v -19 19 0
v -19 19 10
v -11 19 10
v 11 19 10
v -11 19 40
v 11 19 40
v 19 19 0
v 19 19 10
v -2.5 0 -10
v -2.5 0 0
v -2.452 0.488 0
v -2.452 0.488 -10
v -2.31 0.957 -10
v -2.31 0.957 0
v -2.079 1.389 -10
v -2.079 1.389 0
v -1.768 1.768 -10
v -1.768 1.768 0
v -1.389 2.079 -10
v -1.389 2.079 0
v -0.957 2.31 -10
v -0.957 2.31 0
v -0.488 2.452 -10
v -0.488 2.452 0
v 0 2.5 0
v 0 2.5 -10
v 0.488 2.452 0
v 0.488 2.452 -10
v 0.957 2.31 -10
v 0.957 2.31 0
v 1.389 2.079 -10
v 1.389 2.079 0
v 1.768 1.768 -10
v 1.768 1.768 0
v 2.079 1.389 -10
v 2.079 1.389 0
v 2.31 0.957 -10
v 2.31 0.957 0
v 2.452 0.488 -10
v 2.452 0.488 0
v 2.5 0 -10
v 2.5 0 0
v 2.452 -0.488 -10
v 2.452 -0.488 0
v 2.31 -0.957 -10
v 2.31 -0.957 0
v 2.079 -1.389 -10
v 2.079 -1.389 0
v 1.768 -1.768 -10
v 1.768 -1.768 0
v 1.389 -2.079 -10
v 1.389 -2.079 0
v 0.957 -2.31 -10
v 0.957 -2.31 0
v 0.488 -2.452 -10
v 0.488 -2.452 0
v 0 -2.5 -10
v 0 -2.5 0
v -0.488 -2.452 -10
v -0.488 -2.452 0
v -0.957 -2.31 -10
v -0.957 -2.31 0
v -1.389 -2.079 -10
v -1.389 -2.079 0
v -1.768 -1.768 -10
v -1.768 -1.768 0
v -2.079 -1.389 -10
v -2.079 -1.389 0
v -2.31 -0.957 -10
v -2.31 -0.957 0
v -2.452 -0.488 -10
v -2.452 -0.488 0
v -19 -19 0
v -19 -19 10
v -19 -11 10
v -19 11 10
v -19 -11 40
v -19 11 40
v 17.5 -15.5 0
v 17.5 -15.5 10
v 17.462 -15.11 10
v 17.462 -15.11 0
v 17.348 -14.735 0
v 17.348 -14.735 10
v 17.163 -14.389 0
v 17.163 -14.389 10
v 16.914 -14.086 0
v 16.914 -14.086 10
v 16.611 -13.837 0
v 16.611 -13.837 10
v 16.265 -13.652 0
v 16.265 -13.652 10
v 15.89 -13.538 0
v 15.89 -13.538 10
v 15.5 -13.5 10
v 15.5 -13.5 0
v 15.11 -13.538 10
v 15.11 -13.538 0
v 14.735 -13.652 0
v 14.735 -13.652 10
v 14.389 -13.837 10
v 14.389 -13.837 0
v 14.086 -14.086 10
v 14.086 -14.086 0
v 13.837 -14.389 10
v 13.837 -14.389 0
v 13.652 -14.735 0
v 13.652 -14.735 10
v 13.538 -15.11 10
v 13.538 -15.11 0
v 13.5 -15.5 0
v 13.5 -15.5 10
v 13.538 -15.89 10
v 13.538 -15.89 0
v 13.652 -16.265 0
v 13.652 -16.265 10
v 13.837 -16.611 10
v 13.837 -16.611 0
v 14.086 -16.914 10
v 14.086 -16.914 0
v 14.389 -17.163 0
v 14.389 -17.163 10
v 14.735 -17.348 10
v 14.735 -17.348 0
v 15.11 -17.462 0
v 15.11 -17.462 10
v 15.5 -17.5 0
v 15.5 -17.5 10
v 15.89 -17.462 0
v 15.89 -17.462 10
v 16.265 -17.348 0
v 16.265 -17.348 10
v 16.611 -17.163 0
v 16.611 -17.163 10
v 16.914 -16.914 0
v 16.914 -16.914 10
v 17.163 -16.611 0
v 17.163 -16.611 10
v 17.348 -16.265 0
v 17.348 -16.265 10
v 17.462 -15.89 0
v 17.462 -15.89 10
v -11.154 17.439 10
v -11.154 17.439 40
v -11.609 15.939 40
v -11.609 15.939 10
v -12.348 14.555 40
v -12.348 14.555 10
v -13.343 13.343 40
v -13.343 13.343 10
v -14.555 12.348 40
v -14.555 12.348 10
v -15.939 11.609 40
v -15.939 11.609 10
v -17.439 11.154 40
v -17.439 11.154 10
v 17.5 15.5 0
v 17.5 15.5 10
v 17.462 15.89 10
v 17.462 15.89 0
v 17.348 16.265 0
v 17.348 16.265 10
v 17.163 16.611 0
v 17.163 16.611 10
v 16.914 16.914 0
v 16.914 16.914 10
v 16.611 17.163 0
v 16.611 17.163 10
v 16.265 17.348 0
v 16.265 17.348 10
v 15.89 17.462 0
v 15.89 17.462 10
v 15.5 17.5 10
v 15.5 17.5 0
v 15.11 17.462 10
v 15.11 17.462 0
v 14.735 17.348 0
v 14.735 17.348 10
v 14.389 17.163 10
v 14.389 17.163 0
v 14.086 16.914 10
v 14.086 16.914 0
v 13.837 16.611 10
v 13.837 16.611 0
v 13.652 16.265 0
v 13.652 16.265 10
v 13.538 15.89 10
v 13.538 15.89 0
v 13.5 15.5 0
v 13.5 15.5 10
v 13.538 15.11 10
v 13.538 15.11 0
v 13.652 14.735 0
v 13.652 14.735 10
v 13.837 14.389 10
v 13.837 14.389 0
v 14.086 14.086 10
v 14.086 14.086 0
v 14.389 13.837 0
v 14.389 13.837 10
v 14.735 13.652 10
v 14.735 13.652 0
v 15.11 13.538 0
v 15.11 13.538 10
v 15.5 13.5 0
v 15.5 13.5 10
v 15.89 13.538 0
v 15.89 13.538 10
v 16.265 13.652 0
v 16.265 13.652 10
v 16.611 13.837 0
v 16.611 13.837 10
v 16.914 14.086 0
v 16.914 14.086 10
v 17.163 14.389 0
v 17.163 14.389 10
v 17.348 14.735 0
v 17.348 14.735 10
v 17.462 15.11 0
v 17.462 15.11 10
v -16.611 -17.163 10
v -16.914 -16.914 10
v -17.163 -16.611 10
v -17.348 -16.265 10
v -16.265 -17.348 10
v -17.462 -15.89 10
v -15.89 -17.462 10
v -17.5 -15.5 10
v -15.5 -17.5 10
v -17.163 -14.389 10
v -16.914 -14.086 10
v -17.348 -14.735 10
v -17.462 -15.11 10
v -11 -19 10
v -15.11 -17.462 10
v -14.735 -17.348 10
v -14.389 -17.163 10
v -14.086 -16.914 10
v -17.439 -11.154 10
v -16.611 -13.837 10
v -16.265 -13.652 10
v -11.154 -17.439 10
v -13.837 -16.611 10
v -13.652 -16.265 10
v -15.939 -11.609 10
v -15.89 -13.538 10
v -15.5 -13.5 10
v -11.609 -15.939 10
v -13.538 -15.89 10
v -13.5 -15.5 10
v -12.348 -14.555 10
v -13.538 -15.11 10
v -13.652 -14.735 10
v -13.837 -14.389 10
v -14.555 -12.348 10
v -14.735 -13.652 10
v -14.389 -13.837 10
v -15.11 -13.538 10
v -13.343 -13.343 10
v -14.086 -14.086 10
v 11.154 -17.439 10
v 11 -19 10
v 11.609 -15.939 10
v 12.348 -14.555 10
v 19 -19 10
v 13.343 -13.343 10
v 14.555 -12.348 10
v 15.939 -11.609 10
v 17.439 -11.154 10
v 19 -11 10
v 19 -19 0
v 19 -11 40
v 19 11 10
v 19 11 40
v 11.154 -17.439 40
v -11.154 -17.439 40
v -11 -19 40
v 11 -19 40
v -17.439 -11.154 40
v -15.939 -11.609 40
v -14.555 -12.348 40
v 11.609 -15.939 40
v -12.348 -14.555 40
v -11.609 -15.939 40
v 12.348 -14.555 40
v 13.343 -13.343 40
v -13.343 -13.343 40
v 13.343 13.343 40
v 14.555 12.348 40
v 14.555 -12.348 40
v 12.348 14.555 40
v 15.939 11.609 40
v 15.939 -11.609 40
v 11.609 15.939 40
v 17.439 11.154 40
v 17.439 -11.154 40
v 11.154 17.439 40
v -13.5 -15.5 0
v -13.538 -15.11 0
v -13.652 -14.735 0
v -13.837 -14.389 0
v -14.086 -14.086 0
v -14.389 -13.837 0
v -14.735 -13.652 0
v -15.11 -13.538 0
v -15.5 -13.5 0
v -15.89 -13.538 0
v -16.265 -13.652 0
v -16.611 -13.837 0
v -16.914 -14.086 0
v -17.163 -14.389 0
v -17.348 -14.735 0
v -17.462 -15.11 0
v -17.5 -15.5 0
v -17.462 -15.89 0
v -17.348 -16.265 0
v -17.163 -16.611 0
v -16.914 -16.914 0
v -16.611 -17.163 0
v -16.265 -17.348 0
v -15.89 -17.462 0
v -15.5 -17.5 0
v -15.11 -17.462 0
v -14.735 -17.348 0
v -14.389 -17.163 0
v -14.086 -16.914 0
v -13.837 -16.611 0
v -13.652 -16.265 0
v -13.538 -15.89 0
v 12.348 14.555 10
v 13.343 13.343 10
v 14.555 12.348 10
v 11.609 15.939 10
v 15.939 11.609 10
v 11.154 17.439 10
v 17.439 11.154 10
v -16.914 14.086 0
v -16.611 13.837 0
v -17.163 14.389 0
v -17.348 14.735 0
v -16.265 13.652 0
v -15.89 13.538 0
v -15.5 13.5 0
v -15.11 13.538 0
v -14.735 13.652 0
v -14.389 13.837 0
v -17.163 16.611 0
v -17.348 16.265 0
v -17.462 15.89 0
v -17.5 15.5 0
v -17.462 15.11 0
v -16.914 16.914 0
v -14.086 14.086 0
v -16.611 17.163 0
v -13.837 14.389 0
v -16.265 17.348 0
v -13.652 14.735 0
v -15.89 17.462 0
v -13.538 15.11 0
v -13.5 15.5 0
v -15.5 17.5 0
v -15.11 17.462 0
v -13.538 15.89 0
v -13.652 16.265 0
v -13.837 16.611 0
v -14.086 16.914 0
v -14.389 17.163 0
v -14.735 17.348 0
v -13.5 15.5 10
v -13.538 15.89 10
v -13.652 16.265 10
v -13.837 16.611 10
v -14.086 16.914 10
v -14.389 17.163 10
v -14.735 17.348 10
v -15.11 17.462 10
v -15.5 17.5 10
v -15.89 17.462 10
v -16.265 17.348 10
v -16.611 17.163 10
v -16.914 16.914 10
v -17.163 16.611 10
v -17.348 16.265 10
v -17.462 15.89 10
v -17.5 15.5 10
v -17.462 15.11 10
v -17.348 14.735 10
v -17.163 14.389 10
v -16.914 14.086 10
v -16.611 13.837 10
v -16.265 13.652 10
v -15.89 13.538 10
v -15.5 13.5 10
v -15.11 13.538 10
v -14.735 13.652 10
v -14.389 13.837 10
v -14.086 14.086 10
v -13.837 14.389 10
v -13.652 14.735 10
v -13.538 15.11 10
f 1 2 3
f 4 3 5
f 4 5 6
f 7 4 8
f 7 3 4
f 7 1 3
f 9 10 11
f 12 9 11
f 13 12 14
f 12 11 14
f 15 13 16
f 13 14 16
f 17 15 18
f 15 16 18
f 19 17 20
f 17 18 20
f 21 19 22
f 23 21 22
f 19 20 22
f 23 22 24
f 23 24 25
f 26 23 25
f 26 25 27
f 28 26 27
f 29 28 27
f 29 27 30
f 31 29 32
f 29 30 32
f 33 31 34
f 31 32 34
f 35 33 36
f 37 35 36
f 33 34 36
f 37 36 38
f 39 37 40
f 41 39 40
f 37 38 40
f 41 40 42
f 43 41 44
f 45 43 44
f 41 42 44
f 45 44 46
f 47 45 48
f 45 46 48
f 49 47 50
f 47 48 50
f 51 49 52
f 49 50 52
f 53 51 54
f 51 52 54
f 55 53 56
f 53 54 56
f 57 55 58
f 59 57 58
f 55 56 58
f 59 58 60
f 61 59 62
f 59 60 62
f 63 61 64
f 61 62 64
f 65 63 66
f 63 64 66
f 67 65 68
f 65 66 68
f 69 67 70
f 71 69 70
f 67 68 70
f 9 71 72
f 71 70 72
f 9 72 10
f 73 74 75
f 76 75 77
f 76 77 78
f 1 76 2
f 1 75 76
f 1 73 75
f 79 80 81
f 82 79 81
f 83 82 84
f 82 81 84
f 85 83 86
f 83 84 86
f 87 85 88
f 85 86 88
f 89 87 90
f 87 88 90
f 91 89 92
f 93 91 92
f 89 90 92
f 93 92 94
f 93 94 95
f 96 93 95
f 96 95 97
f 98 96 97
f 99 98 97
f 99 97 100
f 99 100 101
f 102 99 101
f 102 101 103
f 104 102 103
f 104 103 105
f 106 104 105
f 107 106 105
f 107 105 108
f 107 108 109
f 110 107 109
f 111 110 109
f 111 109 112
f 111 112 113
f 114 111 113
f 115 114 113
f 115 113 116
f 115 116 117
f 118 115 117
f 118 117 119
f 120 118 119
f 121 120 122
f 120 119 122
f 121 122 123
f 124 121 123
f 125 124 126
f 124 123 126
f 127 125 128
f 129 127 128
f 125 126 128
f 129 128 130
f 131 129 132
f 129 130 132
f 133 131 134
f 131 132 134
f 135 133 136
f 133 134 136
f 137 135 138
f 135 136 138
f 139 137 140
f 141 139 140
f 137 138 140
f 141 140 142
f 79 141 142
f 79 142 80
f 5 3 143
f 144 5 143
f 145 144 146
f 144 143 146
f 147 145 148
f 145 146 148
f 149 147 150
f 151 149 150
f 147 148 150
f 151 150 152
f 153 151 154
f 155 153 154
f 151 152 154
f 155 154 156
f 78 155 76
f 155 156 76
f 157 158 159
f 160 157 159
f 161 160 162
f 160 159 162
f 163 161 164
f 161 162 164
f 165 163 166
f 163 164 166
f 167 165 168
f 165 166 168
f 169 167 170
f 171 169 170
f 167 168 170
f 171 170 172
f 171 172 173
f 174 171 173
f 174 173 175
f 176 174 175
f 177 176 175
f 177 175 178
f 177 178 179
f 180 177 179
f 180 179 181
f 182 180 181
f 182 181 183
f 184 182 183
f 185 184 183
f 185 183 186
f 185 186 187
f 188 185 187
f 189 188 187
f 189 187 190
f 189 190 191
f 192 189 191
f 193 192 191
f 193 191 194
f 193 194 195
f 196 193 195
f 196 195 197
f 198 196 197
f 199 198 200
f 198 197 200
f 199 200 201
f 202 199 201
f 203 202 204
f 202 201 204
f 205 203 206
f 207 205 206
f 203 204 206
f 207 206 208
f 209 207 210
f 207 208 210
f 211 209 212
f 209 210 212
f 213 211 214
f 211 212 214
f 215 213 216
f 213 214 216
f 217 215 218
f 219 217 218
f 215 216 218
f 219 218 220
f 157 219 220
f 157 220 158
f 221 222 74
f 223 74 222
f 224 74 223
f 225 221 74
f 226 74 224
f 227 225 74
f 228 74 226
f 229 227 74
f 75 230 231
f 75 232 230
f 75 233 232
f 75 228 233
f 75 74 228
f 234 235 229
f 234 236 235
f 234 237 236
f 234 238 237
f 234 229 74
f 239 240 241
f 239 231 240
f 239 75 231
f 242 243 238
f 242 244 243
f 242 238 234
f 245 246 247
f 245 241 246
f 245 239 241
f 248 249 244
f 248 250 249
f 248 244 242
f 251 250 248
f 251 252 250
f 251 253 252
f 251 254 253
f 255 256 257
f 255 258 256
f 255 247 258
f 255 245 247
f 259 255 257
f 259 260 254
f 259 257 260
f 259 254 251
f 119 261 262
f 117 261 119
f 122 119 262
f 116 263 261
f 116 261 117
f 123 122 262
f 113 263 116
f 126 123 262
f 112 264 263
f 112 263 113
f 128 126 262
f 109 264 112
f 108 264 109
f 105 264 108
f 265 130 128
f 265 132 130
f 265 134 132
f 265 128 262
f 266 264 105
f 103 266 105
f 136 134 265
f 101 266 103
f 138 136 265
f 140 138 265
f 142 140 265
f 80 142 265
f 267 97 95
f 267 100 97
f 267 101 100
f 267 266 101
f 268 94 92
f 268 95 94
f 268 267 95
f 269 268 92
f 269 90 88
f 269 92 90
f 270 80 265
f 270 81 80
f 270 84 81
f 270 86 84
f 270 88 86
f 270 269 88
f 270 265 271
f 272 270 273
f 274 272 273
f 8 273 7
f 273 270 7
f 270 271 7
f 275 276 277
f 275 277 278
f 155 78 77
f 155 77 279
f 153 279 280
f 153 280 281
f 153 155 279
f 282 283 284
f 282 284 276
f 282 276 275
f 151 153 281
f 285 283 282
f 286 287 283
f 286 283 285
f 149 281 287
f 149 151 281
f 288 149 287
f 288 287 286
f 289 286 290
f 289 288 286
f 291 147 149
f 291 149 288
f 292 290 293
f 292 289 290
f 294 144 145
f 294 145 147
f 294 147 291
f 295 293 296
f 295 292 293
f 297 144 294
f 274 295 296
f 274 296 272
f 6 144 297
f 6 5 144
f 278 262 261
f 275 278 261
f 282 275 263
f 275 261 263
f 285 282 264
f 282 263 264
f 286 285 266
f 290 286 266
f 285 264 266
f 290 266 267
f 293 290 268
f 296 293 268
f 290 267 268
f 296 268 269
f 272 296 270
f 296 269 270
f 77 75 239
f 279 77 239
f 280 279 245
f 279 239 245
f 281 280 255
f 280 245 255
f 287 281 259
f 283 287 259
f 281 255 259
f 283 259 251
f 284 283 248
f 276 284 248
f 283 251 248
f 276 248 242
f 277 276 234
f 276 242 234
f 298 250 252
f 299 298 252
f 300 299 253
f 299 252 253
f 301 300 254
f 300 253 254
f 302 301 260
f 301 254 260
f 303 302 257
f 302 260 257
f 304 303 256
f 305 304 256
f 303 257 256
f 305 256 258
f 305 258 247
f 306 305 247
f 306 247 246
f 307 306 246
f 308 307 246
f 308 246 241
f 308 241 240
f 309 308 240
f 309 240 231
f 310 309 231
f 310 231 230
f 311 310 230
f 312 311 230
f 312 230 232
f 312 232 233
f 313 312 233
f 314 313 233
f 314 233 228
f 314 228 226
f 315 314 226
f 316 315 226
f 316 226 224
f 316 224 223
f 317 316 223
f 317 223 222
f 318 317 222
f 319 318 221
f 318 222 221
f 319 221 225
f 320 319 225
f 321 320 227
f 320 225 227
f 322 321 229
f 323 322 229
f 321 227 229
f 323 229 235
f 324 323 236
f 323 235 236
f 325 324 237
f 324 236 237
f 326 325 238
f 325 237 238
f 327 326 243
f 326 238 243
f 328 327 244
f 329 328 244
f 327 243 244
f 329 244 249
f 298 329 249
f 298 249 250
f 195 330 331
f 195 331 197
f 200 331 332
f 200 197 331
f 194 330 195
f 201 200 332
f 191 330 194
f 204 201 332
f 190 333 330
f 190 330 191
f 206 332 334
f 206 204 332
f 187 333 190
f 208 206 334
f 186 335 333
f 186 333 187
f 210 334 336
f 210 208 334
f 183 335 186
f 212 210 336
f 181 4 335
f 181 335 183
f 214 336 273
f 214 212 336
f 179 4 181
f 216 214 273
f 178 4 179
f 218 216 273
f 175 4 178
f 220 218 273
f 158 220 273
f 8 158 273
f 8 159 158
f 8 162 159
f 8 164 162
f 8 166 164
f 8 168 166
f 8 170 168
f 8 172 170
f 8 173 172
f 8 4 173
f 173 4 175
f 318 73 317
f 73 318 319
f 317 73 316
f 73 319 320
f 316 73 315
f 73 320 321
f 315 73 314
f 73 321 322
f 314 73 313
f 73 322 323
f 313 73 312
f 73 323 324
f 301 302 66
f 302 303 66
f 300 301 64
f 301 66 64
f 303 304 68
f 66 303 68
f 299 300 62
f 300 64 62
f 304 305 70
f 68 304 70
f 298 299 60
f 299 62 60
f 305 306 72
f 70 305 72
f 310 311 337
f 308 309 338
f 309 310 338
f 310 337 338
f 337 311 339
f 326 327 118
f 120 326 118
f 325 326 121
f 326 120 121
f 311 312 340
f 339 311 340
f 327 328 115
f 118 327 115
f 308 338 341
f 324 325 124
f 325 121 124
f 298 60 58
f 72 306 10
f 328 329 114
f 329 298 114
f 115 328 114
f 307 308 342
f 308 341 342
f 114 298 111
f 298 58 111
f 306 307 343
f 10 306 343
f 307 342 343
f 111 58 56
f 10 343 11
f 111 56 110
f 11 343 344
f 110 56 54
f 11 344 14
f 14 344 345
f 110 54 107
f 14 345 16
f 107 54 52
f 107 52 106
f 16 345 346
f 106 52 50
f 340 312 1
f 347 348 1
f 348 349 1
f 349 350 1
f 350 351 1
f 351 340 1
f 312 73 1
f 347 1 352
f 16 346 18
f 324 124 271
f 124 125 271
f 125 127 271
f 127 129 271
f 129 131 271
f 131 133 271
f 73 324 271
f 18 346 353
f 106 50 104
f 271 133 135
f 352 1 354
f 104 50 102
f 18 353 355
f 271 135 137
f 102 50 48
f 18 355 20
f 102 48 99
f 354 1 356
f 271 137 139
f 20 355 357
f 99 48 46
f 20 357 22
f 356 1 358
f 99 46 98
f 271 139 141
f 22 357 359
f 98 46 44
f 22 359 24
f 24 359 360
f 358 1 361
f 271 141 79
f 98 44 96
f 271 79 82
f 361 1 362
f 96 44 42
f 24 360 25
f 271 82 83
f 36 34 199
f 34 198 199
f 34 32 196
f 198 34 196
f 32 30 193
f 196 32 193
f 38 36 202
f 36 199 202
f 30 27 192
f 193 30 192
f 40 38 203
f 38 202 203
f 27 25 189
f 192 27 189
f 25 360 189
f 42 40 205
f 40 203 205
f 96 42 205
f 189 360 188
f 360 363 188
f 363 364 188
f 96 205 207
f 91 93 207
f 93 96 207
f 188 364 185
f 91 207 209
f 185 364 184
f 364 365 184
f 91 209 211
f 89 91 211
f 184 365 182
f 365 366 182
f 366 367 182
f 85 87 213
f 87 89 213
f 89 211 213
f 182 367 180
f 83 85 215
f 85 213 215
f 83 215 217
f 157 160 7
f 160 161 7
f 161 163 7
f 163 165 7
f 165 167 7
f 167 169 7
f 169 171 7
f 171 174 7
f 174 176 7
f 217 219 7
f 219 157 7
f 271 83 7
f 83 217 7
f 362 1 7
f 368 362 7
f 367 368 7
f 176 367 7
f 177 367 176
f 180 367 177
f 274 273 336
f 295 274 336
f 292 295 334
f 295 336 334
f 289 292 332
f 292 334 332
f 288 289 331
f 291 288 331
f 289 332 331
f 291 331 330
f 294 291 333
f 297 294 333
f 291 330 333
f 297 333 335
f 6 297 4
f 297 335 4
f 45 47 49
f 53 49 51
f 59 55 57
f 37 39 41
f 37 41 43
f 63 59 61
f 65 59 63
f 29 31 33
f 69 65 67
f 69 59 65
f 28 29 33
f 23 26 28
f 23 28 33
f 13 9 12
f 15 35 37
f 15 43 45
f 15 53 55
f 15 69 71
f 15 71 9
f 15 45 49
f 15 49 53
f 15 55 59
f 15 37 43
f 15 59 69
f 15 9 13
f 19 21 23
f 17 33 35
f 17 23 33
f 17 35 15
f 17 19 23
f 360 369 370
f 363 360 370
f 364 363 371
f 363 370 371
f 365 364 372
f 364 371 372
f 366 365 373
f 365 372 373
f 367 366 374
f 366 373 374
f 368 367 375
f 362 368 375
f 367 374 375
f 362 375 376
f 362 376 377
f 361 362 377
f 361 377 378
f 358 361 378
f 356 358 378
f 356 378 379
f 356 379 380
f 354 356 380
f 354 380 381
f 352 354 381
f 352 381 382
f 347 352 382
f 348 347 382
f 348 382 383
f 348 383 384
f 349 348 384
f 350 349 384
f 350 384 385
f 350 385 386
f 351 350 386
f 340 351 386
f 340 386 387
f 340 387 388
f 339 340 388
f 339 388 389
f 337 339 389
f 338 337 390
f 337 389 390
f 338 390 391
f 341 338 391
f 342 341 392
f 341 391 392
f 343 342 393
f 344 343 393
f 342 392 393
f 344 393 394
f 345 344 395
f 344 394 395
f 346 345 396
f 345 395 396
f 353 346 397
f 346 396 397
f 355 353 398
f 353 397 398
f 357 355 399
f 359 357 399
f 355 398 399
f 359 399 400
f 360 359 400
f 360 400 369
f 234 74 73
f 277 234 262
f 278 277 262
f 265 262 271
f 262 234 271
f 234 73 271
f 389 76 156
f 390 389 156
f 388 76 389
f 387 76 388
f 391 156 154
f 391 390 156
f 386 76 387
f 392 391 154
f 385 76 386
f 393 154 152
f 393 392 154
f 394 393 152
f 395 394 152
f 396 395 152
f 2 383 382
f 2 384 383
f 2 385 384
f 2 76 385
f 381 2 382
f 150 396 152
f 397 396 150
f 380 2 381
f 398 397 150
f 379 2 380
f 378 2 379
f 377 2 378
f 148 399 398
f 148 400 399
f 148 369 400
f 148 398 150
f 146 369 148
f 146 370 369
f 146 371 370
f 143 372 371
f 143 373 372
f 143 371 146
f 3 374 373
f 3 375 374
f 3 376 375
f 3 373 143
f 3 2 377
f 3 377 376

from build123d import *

# Parameters (mm, degrees)
SKETCH1_W           = 38
SKETCH1_H           = 38
BOSS_EXTRUDE1_DEPTH = 10
SKETCH2_R           = 2
CUT_EXTRUDE1_DEPTH  = 29.670542374
BOSS_EXTRUDE2_DEPTH = 30
SKETCH8_R           = 2.5
BOSS_EXTRUDE4_DEPTH = 10


with BuildPart() as part:
    # Sketch1 → Boss-Extrude1 (new body)
    with BuildSketch(Plane.XY):
        Rectangle(SKETCH1_W, SKETCH1_H)
    extrude(amount=BOSS_EXTRUDE1_DEPTH)

    # Sketch2 → Cut-Extrude1 (cut, through all)
    with BuildSketch(Plane.XY.offset(10)):
        with Locations((15.5, 15.5)):
            Circle(SKETCH2_R)
        with Locations((15.5, -15.5)):
            Circle(SKETCH2_R)
        with Locations((-15.5, -15.5)):
            Circle(SKETCH2_R)
        with Locations((-15.5, 15.5)):
            Circle(SKETCH2_R)
    extrude(amount=-CUT_EXTRUDE1_DEPTH, mode=Mode.SUBTRACT)

    # Sketch6 → Boss-Extrude2 (add)
    with BuildSketch(Plane.XY.offset(10)):
        with BuildLine():
            Line((-19, 11), (-19, -11))
            ThreePointArc((-19, -11), (-13.343145751, -13.343145751), (-11, -19))
            Line((-11, -19), (11, -19))
            ThreePointArc((11, -19), (13.343145751, -13.343145751), (19, -11))
            Line((19, -11), (19, 11))
            ThreePointArc((19, 11), (13.343145751, 13.343145751), (11, 19))
            Line((11, 19), (-11, 19))
            ThreePointArc((-11, 19), (-13.343145751, 13.343145751), (-19, 11))
        make_face()
    extrude(amount=BOSS_EXTRUDE2_DEPTH)

    # Sketch8 → Boss-Extrude4 (add)
    with BuildSketch(Plane(origin=(0, 0, 0), x_dir=(-1, 0, 0), z_dir=(0, 0, -1))):
        Circle(SKETCH8_R)
    extrude(amount=BOSS_EXTRUDE4_DEPTH)


solid = part.part
